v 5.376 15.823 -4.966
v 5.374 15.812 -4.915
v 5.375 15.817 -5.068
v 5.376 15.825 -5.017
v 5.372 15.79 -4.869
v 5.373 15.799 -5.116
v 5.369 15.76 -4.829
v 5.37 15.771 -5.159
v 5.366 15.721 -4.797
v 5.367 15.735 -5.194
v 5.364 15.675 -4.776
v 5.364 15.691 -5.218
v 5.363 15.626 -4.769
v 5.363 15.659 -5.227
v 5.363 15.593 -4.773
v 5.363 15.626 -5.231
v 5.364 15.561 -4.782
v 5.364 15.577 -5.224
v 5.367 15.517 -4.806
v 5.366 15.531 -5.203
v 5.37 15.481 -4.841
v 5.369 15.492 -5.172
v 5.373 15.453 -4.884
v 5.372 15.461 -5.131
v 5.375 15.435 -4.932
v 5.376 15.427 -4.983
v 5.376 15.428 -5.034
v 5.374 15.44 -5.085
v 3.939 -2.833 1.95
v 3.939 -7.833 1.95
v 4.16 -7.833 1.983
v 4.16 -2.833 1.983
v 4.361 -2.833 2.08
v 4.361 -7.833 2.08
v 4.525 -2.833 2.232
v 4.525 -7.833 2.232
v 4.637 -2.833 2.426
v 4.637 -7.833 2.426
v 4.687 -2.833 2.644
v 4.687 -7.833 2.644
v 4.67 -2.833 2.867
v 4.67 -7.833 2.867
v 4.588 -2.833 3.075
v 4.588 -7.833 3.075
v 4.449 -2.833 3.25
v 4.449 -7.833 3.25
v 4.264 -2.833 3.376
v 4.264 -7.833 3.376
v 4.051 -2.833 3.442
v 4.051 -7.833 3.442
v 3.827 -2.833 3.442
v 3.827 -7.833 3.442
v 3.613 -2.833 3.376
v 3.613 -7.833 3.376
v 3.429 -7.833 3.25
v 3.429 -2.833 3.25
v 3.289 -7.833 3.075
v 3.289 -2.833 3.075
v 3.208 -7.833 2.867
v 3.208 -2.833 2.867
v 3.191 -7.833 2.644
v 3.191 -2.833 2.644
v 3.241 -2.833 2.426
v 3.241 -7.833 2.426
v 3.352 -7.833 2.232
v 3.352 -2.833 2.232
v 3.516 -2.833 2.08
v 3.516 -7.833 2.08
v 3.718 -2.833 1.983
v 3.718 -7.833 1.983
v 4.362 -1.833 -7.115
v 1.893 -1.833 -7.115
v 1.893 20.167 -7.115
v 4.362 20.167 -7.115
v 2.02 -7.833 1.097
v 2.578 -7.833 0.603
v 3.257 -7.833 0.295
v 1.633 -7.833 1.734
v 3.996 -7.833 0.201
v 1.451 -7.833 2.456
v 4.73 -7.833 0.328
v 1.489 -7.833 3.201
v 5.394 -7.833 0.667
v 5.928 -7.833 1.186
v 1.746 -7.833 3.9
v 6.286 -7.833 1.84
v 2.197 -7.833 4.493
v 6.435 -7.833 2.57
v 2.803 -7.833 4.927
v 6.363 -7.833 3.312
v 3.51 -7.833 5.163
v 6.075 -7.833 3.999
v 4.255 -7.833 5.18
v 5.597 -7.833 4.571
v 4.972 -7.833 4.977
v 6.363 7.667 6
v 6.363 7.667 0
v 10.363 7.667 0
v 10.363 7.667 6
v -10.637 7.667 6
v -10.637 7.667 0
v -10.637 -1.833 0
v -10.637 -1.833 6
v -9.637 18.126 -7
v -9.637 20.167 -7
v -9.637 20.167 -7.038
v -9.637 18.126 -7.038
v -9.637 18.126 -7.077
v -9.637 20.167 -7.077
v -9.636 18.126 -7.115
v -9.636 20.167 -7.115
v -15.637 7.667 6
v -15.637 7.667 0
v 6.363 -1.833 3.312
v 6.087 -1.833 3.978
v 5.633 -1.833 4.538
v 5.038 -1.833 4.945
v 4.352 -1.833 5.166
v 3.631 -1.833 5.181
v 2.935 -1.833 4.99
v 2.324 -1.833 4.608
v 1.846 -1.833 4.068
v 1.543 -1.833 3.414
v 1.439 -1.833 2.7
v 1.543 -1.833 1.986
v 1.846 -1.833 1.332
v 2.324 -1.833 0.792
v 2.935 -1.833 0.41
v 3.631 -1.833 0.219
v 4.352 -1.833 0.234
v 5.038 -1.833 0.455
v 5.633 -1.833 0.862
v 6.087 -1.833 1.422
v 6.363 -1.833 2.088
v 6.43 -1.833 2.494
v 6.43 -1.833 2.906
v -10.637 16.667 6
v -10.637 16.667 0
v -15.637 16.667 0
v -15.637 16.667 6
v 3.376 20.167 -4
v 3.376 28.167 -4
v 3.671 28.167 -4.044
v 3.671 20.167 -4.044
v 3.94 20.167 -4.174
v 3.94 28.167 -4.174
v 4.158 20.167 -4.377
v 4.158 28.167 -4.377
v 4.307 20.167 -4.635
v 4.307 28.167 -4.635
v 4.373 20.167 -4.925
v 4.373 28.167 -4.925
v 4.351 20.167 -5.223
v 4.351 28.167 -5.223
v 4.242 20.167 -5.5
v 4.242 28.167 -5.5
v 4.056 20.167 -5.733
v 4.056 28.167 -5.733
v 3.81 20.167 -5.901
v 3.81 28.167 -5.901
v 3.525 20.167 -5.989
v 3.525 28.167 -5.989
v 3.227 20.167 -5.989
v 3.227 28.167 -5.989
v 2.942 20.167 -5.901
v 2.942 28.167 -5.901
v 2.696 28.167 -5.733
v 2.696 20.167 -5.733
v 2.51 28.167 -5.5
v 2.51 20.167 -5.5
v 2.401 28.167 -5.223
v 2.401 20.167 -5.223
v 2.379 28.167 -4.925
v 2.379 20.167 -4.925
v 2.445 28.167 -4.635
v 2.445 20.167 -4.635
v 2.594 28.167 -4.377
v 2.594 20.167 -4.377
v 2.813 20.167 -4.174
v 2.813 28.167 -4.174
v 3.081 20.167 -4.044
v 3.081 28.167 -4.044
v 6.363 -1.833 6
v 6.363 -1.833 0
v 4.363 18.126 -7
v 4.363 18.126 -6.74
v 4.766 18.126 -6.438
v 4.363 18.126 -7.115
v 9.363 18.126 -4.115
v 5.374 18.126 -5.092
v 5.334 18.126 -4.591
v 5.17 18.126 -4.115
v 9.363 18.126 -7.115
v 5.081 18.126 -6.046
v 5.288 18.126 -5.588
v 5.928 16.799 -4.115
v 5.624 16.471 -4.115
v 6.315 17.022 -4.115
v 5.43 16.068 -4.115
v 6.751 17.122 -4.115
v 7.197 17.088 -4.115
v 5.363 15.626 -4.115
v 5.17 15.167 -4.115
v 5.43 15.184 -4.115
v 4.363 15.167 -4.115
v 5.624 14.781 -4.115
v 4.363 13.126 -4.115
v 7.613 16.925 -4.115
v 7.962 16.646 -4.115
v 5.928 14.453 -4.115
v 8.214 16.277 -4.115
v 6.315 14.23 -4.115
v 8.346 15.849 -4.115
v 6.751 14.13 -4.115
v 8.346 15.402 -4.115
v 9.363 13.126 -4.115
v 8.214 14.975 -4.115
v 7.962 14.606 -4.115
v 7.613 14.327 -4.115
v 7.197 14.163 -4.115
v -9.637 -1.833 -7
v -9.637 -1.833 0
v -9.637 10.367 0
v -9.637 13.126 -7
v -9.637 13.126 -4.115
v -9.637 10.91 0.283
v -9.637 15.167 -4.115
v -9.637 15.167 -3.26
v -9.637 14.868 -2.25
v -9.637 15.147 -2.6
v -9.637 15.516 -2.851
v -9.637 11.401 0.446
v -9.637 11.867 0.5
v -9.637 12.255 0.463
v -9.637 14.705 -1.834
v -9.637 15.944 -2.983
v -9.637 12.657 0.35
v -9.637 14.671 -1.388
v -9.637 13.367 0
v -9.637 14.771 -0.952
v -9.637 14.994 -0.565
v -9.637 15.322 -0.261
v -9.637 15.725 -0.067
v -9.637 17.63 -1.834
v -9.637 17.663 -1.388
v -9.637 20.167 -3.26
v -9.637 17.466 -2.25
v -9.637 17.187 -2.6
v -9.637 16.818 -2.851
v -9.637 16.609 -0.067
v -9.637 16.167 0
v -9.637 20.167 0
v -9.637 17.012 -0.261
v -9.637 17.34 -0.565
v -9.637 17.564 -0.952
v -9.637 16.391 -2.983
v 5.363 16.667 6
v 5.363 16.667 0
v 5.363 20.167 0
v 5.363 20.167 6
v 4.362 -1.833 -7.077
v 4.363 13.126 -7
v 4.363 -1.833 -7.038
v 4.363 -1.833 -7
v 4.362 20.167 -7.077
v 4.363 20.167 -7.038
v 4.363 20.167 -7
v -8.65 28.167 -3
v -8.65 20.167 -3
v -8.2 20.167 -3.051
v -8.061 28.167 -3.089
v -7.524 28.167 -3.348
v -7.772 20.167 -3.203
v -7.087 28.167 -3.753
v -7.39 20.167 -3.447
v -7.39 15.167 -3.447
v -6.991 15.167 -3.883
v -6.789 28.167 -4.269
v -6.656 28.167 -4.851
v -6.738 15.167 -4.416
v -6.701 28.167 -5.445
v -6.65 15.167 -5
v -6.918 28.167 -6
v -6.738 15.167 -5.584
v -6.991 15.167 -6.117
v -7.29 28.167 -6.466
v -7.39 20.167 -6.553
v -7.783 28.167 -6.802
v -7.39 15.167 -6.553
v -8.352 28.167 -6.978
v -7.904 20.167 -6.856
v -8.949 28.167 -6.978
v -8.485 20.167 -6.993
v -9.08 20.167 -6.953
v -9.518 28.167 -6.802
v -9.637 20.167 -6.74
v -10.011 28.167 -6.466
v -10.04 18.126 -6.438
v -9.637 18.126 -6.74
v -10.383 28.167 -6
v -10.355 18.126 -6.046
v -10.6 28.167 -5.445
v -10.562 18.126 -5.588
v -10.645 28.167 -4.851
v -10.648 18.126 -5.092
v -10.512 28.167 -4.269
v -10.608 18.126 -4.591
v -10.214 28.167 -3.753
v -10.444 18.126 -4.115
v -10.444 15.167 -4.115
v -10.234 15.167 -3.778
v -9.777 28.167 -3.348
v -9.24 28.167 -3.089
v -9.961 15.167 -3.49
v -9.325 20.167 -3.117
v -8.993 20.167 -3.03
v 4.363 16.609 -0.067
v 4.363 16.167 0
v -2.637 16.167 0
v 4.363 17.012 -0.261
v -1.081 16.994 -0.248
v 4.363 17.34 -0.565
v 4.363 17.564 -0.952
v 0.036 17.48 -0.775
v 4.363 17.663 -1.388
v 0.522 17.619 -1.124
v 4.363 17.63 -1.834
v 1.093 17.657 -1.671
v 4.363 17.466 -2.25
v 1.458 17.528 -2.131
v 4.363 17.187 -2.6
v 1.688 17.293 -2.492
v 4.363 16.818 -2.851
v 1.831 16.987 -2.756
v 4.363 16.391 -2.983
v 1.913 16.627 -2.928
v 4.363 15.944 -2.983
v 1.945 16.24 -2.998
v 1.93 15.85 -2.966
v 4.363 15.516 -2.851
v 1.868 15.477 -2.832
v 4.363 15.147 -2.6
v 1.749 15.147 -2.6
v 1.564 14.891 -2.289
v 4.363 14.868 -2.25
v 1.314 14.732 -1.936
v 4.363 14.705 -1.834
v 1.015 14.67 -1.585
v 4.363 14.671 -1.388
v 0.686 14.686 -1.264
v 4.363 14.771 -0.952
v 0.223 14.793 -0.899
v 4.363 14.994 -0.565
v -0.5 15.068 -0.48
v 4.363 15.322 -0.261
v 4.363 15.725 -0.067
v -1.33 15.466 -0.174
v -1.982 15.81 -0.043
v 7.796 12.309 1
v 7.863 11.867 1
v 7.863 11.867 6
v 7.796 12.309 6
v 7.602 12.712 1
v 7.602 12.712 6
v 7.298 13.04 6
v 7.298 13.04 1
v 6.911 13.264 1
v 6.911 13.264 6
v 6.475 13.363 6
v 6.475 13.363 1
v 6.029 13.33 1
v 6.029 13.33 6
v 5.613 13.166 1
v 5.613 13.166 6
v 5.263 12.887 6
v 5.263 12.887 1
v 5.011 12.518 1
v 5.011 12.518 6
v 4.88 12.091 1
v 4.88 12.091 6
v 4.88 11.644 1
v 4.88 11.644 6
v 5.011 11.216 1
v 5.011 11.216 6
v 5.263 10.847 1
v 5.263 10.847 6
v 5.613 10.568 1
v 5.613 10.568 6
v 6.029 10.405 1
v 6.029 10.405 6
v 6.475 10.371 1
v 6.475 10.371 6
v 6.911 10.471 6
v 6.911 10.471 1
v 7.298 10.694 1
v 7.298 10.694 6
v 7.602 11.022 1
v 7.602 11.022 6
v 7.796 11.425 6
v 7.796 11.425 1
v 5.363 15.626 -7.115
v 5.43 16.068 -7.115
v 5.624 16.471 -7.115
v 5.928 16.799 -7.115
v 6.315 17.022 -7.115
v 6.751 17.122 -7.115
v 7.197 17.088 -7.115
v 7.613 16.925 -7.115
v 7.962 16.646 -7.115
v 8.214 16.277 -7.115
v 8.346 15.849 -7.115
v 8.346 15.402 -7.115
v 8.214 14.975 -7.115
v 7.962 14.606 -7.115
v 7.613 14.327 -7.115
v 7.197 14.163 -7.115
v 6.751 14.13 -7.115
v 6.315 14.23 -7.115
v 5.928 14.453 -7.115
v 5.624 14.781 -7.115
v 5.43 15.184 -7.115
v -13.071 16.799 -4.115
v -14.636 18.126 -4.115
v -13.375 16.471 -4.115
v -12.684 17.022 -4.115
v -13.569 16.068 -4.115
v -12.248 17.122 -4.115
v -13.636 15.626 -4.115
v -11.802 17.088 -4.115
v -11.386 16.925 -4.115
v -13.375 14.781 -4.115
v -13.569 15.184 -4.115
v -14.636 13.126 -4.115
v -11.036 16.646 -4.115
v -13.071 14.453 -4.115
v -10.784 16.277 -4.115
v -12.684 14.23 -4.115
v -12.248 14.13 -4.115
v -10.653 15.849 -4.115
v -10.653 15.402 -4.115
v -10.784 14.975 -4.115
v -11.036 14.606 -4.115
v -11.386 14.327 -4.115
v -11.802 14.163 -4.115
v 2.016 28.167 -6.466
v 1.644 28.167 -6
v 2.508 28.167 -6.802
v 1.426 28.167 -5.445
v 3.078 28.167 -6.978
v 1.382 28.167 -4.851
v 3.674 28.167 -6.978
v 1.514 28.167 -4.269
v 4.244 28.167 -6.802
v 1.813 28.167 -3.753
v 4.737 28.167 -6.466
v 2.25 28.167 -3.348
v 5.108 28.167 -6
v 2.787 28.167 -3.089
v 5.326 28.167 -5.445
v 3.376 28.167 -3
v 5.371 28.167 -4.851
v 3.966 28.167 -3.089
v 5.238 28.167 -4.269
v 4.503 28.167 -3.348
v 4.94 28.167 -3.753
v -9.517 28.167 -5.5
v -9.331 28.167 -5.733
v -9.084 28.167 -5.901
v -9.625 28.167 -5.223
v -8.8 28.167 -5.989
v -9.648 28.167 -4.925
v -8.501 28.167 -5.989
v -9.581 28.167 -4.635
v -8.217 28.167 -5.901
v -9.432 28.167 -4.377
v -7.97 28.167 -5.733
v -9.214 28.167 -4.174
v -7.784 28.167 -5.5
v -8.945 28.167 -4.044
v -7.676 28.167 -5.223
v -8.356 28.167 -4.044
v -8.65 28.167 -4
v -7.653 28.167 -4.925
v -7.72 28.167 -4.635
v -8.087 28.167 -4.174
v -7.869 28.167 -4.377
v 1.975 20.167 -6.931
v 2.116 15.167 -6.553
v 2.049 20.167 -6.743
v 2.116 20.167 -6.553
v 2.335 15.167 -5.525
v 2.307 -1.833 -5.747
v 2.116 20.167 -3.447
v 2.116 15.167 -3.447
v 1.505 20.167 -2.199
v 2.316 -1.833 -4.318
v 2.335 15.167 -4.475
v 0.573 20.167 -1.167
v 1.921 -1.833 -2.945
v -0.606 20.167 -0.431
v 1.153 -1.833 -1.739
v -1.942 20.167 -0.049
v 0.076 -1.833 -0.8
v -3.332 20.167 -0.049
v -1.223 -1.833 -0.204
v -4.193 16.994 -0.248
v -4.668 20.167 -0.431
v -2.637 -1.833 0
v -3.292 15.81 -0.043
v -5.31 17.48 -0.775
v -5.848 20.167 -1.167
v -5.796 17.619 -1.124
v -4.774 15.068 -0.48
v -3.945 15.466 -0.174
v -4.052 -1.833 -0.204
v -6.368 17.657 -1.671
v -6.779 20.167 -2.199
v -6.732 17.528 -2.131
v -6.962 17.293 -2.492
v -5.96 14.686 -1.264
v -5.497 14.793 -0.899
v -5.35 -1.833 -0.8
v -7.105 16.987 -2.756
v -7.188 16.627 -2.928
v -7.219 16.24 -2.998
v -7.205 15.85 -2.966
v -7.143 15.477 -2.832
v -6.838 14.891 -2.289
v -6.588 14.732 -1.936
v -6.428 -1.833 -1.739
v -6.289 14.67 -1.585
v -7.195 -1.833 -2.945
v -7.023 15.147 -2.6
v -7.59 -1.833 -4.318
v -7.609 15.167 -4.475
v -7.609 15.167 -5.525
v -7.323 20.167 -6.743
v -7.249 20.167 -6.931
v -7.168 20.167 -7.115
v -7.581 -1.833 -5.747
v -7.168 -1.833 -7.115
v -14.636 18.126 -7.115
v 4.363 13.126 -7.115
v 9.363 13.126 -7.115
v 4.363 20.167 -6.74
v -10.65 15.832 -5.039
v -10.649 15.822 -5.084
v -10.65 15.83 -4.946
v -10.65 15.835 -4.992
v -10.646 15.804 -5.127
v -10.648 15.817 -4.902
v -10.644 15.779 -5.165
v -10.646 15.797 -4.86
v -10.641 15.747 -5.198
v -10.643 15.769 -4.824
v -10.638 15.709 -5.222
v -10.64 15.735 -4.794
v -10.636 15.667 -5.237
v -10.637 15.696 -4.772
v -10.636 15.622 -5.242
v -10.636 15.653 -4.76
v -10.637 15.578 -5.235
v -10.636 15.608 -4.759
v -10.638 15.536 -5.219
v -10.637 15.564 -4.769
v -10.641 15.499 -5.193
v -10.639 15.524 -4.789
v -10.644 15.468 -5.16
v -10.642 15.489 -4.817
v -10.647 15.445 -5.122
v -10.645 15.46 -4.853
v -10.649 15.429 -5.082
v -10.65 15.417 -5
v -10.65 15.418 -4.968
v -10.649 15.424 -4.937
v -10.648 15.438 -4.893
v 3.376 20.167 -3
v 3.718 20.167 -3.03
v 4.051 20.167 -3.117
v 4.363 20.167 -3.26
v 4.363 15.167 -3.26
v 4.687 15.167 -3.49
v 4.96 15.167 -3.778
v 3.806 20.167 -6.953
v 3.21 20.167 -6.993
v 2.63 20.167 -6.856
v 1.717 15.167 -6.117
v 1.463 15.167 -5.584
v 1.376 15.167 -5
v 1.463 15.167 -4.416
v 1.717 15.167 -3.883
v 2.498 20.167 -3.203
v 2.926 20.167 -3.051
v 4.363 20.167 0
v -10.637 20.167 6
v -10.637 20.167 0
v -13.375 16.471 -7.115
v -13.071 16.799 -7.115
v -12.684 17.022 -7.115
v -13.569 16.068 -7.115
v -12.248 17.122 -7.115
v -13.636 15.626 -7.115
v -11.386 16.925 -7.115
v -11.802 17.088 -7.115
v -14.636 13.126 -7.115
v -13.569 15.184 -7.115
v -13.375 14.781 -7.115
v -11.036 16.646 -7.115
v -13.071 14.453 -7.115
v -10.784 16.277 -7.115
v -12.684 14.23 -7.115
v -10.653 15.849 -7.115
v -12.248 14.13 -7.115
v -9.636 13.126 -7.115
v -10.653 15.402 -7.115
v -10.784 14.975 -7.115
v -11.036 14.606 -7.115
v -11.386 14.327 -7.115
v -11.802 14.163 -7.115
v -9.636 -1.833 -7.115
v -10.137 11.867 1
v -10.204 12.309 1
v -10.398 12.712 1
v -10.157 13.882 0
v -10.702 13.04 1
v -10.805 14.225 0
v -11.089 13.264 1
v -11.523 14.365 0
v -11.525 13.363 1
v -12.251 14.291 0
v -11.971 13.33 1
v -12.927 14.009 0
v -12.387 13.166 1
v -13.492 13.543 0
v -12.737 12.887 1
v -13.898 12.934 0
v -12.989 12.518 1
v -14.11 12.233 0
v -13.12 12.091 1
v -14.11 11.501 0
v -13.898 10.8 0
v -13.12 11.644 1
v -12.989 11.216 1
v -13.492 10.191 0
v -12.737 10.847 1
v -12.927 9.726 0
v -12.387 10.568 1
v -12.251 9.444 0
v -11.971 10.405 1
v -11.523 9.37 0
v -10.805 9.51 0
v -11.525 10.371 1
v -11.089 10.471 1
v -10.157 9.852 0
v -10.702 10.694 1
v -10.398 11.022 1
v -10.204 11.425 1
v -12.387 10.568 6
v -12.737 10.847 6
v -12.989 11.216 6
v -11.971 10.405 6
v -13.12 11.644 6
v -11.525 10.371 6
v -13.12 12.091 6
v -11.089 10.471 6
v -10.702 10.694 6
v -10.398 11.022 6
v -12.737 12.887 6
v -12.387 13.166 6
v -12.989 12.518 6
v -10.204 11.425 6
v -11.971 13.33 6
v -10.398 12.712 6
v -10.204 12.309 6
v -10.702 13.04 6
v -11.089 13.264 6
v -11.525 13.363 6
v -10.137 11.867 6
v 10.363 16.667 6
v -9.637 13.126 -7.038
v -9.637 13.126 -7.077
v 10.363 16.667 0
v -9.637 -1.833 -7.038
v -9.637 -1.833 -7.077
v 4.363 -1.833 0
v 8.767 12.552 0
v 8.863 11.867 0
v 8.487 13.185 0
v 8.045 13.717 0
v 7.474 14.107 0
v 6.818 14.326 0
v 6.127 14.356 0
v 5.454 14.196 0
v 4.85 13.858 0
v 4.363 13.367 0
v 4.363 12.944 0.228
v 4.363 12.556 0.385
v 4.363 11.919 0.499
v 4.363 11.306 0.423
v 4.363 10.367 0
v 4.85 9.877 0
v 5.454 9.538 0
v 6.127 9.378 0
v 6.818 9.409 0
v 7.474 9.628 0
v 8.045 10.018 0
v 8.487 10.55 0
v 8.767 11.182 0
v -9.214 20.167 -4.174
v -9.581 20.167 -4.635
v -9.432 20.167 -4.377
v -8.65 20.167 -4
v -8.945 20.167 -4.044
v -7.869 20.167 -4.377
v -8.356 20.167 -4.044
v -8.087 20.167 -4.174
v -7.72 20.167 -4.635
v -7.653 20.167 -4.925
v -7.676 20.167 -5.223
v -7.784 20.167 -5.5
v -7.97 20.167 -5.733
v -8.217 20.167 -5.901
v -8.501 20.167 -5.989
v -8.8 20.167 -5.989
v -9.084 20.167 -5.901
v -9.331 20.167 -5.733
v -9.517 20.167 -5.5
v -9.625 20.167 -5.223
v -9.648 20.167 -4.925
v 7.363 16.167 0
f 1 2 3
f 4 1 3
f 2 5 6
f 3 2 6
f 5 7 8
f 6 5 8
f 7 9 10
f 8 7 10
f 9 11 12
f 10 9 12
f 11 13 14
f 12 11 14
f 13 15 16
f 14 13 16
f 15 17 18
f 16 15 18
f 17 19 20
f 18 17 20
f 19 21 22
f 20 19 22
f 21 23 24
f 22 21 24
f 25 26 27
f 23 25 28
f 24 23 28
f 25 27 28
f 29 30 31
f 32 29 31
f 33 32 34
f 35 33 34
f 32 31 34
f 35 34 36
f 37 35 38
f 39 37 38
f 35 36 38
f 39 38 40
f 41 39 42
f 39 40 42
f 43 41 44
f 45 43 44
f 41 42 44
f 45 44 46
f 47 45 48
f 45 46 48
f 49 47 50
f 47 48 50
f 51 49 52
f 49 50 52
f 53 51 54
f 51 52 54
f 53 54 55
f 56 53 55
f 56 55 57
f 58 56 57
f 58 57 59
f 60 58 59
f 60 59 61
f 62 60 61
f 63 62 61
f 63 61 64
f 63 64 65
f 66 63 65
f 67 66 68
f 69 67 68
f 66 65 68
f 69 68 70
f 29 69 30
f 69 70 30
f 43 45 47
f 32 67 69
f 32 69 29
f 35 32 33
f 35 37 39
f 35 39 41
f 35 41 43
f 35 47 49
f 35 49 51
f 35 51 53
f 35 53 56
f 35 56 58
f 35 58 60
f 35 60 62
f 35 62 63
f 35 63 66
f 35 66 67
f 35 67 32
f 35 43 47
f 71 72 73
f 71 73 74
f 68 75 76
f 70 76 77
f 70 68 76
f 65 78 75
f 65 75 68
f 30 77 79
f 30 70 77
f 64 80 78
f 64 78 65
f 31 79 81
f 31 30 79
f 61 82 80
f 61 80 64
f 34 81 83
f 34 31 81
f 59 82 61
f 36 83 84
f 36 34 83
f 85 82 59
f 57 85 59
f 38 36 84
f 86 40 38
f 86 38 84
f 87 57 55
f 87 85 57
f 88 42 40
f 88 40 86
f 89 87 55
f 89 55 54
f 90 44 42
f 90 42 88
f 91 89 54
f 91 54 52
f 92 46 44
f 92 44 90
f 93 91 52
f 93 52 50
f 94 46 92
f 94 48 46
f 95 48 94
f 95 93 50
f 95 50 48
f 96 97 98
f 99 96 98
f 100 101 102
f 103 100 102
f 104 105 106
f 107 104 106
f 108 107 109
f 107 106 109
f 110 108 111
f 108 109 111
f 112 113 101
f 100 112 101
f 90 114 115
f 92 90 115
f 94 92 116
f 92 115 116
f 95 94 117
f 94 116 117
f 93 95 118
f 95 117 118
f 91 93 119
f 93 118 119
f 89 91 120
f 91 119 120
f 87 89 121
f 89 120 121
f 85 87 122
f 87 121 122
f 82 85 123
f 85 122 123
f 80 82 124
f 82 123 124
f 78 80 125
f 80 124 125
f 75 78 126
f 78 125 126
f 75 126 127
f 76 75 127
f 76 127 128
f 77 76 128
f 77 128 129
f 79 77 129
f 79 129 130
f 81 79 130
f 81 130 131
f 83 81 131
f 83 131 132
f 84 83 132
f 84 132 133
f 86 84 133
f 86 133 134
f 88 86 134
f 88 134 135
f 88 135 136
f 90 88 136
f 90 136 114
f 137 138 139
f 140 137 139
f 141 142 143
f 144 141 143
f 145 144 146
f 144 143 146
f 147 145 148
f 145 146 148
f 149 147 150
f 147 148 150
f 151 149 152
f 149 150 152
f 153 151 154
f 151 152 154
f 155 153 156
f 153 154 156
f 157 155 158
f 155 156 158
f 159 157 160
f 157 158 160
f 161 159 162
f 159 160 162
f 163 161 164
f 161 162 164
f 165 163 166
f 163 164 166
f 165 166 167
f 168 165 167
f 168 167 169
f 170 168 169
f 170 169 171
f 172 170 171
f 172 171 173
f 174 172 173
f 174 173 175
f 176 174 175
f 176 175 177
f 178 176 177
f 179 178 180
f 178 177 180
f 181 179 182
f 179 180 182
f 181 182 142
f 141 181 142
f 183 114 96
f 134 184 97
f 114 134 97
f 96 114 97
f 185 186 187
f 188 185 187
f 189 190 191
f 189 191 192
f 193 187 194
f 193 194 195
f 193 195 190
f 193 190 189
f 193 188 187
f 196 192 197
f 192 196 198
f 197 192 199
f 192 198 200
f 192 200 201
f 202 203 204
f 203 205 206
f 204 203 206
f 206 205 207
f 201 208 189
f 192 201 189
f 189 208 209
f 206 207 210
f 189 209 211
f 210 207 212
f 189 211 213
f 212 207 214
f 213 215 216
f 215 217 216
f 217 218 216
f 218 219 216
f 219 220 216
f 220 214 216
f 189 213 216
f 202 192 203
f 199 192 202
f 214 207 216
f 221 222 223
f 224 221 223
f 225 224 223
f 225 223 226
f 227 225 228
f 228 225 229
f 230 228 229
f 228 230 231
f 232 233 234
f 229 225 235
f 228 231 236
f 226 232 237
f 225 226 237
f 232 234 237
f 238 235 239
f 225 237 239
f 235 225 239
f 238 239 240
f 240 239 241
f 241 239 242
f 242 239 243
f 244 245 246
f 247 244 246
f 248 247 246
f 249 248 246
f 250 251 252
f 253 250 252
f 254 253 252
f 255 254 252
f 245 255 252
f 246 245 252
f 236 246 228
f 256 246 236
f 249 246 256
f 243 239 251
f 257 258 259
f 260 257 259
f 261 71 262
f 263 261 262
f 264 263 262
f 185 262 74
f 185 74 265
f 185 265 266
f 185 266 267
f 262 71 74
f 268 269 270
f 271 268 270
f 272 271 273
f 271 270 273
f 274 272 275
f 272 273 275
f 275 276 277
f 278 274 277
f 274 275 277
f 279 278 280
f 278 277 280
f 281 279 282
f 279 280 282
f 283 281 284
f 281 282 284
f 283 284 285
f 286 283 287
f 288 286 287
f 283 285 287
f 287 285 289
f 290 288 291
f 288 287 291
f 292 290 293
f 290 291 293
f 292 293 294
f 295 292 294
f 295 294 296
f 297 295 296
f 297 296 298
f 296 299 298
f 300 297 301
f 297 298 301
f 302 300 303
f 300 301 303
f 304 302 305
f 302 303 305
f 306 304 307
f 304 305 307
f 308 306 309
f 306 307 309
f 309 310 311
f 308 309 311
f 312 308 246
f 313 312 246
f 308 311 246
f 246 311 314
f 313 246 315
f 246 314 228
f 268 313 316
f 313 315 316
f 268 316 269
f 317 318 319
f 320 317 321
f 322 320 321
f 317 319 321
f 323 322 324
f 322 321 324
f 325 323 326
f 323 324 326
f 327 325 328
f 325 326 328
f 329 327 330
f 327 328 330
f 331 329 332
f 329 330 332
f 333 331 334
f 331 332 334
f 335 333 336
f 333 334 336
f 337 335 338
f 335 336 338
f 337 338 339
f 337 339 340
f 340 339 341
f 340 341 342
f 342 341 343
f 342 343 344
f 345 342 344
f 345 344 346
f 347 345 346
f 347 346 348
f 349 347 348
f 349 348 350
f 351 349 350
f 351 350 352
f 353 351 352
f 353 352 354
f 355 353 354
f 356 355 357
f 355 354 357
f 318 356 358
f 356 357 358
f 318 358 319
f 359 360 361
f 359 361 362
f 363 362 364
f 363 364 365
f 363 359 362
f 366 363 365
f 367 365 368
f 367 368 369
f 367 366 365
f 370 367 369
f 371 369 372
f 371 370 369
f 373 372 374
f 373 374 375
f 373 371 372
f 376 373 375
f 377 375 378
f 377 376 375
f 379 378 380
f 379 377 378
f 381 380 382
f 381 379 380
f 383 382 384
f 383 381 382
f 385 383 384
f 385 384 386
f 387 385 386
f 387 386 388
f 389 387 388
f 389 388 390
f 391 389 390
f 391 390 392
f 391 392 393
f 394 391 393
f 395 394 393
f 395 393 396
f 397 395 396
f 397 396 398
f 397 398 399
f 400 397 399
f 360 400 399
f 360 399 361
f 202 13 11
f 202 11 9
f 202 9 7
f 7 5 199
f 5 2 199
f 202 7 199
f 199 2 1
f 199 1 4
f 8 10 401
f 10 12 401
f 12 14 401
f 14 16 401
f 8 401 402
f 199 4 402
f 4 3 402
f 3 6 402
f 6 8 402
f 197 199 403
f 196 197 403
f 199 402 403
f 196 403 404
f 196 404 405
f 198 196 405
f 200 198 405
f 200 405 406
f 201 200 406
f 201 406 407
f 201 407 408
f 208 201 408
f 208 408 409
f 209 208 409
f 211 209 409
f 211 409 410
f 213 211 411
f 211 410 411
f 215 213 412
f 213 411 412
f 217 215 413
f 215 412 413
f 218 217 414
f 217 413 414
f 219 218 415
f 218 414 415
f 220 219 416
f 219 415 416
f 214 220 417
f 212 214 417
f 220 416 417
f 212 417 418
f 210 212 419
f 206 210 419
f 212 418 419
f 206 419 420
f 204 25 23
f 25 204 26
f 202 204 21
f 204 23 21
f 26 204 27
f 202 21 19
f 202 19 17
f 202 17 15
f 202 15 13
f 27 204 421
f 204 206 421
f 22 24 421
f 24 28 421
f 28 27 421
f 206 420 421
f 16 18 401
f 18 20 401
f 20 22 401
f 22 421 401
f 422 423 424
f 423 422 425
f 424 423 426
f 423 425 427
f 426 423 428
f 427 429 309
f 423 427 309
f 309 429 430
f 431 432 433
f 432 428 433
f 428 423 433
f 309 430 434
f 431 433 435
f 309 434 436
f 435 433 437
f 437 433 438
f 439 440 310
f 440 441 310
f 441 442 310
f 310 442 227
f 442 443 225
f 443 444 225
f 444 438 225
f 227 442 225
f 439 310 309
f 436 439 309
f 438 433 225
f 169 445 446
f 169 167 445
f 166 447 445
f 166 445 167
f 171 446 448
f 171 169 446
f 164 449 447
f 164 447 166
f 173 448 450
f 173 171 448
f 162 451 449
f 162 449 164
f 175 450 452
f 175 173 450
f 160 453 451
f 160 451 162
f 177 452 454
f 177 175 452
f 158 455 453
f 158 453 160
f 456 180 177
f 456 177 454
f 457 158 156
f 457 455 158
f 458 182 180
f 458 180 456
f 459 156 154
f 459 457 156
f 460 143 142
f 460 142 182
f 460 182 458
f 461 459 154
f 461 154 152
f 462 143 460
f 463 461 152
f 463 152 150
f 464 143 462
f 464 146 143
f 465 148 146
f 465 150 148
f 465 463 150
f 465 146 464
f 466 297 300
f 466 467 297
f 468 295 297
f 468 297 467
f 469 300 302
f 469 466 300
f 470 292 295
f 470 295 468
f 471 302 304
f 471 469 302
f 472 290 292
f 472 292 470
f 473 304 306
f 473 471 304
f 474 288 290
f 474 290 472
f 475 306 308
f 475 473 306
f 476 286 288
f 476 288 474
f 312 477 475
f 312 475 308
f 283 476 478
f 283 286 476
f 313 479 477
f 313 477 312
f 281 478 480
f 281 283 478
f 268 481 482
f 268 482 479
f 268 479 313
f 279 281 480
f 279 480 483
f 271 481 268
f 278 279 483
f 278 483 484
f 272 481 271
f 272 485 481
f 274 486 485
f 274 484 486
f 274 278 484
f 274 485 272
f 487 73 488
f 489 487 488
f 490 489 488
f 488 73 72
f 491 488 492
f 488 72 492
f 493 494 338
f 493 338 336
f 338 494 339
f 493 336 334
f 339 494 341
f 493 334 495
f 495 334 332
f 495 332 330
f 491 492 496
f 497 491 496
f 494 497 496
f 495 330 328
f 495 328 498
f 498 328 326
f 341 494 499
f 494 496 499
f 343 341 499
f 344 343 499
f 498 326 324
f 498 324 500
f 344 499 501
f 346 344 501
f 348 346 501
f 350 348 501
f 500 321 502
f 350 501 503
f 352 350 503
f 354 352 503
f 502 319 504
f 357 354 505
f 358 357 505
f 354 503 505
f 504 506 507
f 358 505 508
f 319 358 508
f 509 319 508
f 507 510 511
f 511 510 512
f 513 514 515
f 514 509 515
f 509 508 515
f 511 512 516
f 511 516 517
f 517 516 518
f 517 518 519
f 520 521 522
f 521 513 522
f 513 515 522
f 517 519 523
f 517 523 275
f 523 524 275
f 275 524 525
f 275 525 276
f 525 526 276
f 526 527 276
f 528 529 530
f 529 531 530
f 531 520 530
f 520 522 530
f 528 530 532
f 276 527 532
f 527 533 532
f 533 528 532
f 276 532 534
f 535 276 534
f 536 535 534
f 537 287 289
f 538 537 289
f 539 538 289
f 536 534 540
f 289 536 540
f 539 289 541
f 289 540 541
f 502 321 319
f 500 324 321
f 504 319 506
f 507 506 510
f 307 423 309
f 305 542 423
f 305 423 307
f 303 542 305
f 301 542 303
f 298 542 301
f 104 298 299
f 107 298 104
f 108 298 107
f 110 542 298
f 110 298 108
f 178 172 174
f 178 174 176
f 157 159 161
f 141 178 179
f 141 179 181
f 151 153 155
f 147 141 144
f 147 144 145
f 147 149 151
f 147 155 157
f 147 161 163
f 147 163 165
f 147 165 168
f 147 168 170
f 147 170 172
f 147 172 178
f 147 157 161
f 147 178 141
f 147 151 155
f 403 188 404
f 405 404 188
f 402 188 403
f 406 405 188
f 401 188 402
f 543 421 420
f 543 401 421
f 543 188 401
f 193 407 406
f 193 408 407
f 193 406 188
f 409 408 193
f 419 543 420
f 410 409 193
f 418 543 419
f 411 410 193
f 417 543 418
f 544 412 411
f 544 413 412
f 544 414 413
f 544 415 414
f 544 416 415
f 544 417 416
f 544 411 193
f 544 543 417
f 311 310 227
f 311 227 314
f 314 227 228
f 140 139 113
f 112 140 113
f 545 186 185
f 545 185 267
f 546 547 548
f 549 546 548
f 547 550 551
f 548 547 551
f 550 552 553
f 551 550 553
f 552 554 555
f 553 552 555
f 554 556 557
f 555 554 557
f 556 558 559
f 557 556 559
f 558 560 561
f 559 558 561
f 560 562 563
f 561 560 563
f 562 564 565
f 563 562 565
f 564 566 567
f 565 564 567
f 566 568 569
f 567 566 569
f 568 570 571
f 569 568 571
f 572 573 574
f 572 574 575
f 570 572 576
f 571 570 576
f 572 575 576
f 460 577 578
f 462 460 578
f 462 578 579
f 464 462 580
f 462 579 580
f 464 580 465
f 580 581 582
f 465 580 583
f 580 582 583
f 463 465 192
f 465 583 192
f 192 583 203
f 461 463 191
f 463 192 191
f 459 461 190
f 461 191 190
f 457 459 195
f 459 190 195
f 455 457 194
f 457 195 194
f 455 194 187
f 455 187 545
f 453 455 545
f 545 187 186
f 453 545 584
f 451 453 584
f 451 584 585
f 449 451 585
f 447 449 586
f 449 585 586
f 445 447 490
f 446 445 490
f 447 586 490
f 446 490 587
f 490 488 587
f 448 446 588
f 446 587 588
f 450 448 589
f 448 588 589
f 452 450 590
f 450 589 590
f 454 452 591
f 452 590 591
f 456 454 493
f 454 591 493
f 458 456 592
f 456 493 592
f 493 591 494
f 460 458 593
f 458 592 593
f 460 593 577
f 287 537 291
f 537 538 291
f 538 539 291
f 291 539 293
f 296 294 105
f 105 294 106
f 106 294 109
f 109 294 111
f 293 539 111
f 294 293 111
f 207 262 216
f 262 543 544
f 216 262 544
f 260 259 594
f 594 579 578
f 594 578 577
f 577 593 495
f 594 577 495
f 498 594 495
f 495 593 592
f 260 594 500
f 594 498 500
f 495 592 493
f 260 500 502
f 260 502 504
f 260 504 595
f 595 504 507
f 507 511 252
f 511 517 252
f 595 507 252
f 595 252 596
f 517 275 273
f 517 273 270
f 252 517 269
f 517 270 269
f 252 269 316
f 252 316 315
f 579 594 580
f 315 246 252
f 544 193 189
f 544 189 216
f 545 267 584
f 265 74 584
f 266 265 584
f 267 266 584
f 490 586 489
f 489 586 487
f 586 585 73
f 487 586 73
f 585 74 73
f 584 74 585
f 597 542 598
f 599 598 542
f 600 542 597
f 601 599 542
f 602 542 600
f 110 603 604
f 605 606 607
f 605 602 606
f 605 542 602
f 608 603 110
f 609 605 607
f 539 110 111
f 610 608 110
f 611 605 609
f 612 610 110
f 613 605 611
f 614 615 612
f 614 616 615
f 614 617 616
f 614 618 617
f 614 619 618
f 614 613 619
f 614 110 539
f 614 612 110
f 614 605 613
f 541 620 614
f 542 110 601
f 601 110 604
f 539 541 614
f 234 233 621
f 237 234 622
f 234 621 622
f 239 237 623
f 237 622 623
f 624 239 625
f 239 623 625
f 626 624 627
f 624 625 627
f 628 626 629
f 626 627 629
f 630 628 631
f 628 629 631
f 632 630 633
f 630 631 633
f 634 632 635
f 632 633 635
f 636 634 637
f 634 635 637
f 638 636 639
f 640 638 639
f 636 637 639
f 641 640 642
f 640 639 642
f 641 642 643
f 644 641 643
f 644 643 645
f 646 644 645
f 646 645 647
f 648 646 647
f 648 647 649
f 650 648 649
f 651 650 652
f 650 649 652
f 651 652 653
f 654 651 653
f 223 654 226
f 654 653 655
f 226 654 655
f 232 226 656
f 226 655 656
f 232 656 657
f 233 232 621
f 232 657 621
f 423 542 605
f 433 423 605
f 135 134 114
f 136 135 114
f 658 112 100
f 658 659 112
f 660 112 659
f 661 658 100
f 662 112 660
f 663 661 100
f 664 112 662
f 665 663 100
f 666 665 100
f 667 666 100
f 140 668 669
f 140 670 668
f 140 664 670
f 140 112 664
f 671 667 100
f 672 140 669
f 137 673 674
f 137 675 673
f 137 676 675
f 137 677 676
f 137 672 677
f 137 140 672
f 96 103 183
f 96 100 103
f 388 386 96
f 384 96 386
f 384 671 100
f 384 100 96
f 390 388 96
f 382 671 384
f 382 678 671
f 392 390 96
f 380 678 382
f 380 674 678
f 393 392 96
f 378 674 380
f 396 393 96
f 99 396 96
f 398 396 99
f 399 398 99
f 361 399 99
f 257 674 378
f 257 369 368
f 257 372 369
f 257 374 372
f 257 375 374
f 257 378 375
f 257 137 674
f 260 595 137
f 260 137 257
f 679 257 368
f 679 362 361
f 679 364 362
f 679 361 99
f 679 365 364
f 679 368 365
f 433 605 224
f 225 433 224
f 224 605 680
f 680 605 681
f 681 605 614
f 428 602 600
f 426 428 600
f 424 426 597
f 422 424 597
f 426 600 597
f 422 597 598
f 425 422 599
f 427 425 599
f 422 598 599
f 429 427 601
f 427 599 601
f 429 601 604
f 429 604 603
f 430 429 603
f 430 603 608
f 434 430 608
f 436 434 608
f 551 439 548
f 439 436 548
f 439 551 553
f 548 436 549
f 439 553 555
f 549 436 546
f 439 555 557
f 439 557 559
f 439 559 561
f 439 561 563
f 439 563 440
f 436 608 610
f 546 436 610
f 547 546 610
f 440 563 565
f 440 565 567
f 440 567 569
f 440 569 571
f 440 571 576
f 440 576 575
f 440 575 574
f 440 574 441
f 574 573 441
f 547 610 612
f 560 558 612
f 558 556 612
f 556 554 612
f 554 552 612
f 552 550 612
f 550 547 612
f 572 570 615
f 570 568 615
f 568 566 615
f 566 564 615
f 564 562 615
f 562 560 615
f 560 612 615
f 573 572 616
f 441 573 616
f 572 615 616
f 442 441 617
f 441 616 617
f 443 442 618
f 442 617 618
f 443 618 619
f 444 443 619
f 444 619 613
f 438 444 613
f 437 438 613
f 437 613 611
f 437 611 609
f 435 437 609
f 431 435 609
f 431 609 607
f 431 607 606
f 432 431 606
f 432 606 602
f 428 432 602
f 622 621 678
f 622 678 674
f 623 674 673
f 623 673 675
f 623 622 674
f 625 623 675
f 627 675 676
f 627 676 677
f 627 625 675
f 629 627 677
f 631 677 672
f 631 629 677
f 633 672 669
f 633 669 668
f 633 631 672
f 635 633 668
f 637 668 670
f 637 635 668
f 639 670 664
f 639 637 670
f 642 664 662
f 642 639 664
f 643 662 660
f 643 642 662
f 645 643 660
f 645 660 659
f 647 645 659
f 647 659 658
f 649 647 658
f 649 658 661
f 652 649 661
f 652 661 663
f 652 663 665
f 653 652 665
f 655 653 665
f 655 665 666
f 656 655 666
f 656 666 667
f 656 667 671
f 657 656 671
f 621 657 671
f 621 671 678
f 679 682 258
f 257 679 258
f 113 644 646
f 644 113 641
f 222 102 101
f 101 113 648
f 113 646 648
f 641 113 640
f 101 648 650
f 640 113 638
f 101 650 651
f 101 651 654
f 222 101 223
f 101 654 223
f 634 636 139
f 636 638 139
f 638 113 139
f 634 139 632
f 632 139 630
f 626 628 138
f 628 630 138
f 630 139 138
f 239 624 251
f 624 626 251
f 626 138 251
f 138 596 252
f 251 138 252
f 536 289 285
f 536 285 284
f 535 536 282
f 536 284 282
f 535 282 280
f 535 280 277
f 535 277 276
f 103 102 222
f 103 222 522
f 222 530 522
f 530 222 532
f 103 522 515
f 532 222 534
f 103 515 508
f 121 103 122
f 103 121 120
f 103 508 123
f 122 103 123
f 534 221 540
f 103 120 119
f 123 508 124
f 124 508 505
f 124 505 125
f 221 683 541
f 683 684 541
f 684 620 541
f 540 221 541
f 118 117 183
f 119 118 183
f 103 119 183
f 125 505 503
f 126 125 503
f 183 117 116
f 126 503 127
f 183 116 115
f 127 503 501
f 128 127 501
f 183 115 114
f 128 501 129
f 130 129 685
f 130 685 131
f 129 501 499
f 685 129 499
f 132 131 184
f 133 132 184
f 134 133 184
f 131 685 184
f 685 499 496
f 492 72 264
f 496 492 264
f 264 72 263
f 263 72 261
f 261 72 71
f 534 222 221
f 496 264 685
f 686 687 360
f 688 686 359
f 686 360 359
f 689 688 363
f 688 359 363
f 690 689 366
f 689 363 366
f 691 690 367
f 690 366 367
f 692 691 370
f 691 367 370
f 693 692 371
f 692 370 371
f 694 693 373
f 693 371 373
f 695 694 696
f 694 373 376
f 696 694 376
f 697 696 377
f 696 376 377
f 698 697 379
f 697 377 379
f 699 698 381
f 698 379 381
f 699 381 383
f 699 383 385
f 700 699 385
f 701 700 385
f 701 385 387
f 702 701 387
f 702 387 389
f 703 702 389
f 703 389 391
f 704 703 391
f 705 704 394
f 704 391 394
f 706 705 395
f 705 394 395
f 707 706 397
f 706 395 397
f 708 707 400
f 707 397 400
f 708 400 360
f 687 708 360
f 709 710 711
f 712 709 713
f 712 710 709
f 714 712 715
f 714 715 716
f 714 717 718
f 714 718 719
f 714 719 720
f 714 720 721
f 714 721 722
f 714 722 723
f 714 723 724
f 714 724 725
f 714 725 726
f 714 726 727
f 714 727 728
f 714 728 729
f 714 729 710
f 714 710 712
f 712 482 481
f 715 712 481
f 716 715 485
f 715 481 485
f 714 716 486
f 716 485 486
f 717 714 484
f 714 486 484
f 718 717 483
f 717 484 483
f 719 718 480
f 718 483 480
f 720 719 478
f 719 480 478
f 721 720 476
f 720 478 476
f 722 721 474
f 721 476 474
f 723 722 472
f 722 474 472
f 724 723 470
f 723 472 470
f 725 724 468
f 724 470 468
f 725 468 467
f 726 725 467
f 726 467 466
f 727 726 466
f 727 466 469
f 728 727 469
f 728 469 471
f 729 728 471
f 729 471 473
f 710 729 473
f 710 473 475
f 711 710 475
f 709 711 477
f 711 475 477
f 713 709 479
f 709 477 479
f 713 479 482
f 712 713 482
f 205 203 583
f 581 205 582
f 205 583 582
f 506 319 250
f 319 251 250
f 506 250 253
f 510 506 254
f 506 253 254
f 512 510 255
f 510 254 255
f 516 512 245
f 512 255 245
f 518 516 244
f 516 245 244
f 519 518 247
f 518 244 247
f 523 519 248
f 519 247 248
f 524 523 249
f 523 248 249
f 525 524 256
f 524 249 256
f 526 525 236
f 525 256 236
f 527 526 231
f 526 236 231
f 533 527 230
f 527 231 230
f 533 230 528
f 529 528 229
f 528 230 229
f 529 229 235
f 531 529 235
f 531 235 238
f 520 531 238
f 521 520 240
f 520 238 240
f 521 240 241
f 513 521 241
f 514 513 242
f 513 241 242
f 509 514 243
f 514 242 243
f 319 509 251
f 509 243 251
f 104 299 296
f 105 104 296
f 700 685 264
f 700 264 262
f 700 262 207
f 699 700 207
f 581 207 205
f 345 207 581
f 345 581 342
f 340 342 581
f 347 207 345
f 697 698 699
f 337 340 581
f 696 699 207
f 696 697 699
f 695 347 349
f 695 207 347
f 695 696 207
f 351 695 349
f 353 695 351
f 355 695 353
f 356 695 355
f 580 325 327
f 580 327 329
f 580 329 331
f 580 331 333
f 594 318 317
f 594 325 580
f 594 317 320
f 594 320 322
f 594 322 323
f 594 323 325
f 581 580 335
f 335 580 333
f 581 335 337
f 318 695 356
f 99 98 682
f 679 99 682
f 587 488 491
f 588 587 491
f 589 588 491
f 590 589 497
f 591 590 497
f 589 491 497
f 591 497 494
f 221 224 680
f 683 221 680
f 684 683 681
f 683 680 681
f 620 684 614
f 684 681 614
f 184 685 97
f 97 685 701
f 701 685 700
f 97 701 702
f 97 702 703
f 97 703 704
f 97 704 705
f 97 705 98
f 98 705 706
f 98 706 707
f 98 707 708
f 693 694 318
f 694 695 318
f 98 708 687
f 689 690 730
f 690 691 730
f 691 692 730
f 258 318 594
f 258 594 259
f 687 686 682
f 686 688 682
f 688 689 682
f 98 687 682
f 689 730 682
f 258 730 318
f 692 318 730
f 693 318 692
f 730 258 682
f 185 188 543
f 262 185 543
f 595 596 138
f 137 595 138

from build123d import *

# Parameters (mm, degrees)
ESBO_O1_R                      = 1.5
RESSALTO_EXTRUS_O1_DEPTH       = 6
ESBO_O6_W                      = 14
ESBO_O6_H                      = 22
RESSALTO_EXTRUS_O3_DEPTH       = 12
ESBO_O7_R                      = 5
CORTE_EXTRUS_O4_DEPTH          = 30.538450843
FILETE3_R                      = 5
ESBO_O11_R                     = 2.5
RESSALTO_EXTRUS_O11_DEPTH      = 6
RESSALTO_EXTRUS_O13_DEPTH      = 8
RESSALTO_EXTRUS_O13_DEPTH_BACK = 5
ESBO_O15_R                     = 2
ESBO_O17_R                     = 1
CORTE_EXTRUS_O6_DEPTH          = 8
ESBO_O20_R                     = 0.75
CORTE_EXTRUS_O7_DEPTH          = 5
ESBO_O21_W                     = 22.669500521
ESBO_O21_H                     = 31.157259519
CORTE_EXTRUS_O8_DEPTH          = 6
ESBO_O22_W                     = 5
ESBO_O22_H                     = 5
ESBO_O22_R                     = 1.5
RESSALTO_EXTRUS_O15_DEPTH      = 3
CHANFRO5_SIZE                  = 1
ESBO_O23_R                     = 1.5
CORTE_EXTRUS_O9_DEPTH          = 17


with BuildPart() as part:
    # Esboço1 → Ressalto-extrusão1 (new body)
    with BuildSketch(Plane.XY):
        Polygon((-10.637137788, -1.832768542), (6.362862212, -1.832768542), (6.362862212, 7.667231458), (10.362862212, 7.667231458), (10.362862212, 16.667231458), (5.362862212, 16.667231458), (5.362862212, 20.167231458), (-10.637137788, 20.167231458), (-10.637137788, 16.667231458), (-15.637137788, 16.667231458), (-15.637137788, 7.667231458), (-10.637137788, 7.667231458), align=None)
        with Locations((6.362862212, 11.867231458)):
            Circle(ESBO_O1_R, mode=Mode.SUBTRACT)
        with Locations((-11.637137788, 11.867231458)):
            Circle(ESBO_O1_R, mode=Mode.SUBTRACT)
    extrude(amount=RESSALTO_EXTRUS_O1_DEPTH)

    # Esboço6 → Ressalto-extrusão3 (add)
    with BuildSketch(Plane(origin=(0, 0, 0), x_dir=(-1, 0, 0), z_dir=(0, 0, -1))):
        with Locations((2.637137788, 9.167231458)):
            Rectangle(ESBO_O6_W, ESBO_O6_H)
    extrude(amount=RESSALTO_EXTRUS_O3_DEPTH)

    # Esboço7 → Corte-extrusão4 (cut, through all)
    with BuildSketch(Plane.XZ.offset(1.832768542)):
        with Locations(Location((-2.637137788, -5, 0), (0, 0, 270))):
            Circle(ESBO_O7_R)
    extrude(amount=-CORTE_EXTRUS_O4_DEPTH, mode=Mode.SUBTRACT)

    # Filete3
    filete3_edges = [part.edges().sort_by_distance(p)[0] for p in [
        (4.362862212, 9.167231458, -12),
        (-9.637137788, 9.167231458, -12),
    ]]
    fillet(filete3_edges, radius=FILETE3_R)

    # Esboço11 → Ressalto-extrusão11 (add)
    with BuildSketch(Plane.XZ.offset(1.832768542)):
        with Locations(Location((3.938862212, 2.7, 0), (0, 0, 14.163833683))):
            Circle(ESBO_O11_R)
    extrude(amount=RESSALTO_EXTRUS_O11_DEPTH)

    # Esboço15 → Ressalto-extrusão13 (add, two sides: drawn at the far end of the back side and taken through both)
    with BuildSketch(Plane(origin=(0, 20.167231458, 0), x_dir=(1, 0, 0), z_dir=(0, 1, 0)).offset(-RESSALTO_EXTRUS_O13_DEPTH_BACK)):
        with Locations(Location((-8.650480796, 5, 0), (0, 0, 270))):
            Circle(ESBO_O15_R)
        with Locations(Location((3.376205221, 5, 0), (0, 0, 270))):
            Circle(ESBO_O15_R)
    extrude(amount=RESSALTO_EXTRUS_O13_DEPTH + RESSALTO_EXTRUS_O13_DEPTH_BACK)

    # Esboço17 → Corte-extrusão6 (cut)
    with BuildSketch(Plane(origin=(0, 28.167231458, 0), x_dir=(1, 0, 0), z_dir=(0, 1, 0))):
        with Locations(Location((-8.650480796, 5, 0), (0, 0, 270))):
            Circle(ESBO_O17_R)
        with Locations(Location((3.376205221, 5, 0), (0, 0, 270))):
            Circle(ESBO_O17_R)
    extrude(amount=-CORTE_EXTRUS_O6_DEPTH, mode=Mode.SUBTRACT)

    # Esboço20 → Corte-extrusão7 (cut)
    with BuildSketch(Plane.XZ.offset(7.832768542)):
        with Locations(Location((3.938862212, 2.7, 0), (0, 0, 270))):
            Circle(ESBO_O20_R)
    extrude(amount=-CORTE_EXTRUS_O7_DEPTH, mode=Mode.SUBTRACT)

    # Esboço21 → Corte-extrusão8 (cut)
    with BuildSketch(Plane(origin=(0, 0, -7.115225733), x_dir=(1, 0, 0), z_dir=(0, 0, -1))):
        with Locations((-2.778124877, -9.864448806)):
            Rectangle(ESBO_O21_W, ESBO_O21_H)
    extrude(amount=CORTE_EXTRUS_O8_DEPTH, mode=Mode.SUBTRACT)

    # Esboço22 → Ressalto-extrusão15 (add)
    # profile 1 of 2: a face of its own
    with BuildSketch(Plane(origin=(0, 0, -7.115225733), x_dir=(1, 0, 0), z_dir=(0, 0, -1))):
        with Locations((-12.135809914, -15.625880271)):
            Rectangle(ESBO_O22_W, ESBO_O22_H)
        with Locations(Location((-12.135809914, -15.625880271, 0), (0, 0, 180))):
            Circle(ESBO_O22_R, mode=Mode.SUBTRACT)
    # profile 2 of 2: a face of its own
    with BuildSketch(Plane(origin=(0, 0, -7.115225733), x_dir=(1, 0, 0), z_dir=(0, 0, -1))):
        with Locations((6.862862212, -15.625880271)):
            Rectangle(ESBO_O22_W, ESBO_O22_H)
        with Locations(Location((6.862862212, -15.625880271, 0), (0, 0, 180))):
            Circle(ESBO_O22_R, mode=Mode.SUBTRACT)
    extrude(amount=-RESSALTO_EXTRUS_O15_DEPTH)

    # Chanfro5
    # the kernel refuses this chamfer: 1 mm, written as the material it takes off along each edge
    with BuildSketch(Plane(origin=(6.362862212, 11.867231458, 0), x_dir=(1, 0, 0), z_dir=(0, -1, 0))) as chanfro5_piece_1_section:
        Polygon((1.5 + CHANFRO5_SIZE, 0), (1.5, CHANFRO5_SIZE), (1.5, 0), align=None)
    chanfro5_piece_1 = revolve(axis=Axis((6.362862212, 11.867231458, 0), (0, 0, 1)), mode=Mode.PRIVATE)
    chanfro5_piece_1 = split(chanfro5_piece_1, bisect_by=Plane(origin=(4.362862212, 13.893105183, 0.134898453), z_dir=(1, 0, 0)), keep=Keep.TOP, mode=Mode.PRIVATE)
    add(chanfro5_piece_1, mode=Mode.SUBTRACT)
    with BuildSketch(Plane(origin=(-11.637137788, 11.867231458, 0), x_dir=(1, 0, 0), z_dir=(0, -1, 0))) as chanfro5_piece_2_section:
        Polygon((1.5 + CHANFRO5_SIZE, 0), (1.5, CHANFRO5_SIZE), (1.5, 0), align=None)
    chanfro5_piece_2 = revolve(axis=Axis((-11.637137788, 11.867231458, 0), (0, 0, 1)), mode=Mode.PRIVATE)
    chanfro5_piece_2 = split(chanfro5_piece_2, bisect_by=Plane(origin=(-9.637137788, 11.867231458, 0.487087965), z_dir=(-1, 0, 0)), keep=Keep.TOP, mode=Mode.PRIVATE)
    add(chanfro5_piece_2, mode=Mode.SUBTRACT)

    # Esboço23 → Corte-extrusão9 (cut)
    with BuildSketch(Plane.ZY.offset(9.637137788)):
        with Locations((-1.5, 16.167231458)):
            Circle(ESBO_O23_R)
    extrude(amount=-CORTE_EXTRUS_O9_DEPTH, mode=Mode.SUBTRACT)


solid = part.part
